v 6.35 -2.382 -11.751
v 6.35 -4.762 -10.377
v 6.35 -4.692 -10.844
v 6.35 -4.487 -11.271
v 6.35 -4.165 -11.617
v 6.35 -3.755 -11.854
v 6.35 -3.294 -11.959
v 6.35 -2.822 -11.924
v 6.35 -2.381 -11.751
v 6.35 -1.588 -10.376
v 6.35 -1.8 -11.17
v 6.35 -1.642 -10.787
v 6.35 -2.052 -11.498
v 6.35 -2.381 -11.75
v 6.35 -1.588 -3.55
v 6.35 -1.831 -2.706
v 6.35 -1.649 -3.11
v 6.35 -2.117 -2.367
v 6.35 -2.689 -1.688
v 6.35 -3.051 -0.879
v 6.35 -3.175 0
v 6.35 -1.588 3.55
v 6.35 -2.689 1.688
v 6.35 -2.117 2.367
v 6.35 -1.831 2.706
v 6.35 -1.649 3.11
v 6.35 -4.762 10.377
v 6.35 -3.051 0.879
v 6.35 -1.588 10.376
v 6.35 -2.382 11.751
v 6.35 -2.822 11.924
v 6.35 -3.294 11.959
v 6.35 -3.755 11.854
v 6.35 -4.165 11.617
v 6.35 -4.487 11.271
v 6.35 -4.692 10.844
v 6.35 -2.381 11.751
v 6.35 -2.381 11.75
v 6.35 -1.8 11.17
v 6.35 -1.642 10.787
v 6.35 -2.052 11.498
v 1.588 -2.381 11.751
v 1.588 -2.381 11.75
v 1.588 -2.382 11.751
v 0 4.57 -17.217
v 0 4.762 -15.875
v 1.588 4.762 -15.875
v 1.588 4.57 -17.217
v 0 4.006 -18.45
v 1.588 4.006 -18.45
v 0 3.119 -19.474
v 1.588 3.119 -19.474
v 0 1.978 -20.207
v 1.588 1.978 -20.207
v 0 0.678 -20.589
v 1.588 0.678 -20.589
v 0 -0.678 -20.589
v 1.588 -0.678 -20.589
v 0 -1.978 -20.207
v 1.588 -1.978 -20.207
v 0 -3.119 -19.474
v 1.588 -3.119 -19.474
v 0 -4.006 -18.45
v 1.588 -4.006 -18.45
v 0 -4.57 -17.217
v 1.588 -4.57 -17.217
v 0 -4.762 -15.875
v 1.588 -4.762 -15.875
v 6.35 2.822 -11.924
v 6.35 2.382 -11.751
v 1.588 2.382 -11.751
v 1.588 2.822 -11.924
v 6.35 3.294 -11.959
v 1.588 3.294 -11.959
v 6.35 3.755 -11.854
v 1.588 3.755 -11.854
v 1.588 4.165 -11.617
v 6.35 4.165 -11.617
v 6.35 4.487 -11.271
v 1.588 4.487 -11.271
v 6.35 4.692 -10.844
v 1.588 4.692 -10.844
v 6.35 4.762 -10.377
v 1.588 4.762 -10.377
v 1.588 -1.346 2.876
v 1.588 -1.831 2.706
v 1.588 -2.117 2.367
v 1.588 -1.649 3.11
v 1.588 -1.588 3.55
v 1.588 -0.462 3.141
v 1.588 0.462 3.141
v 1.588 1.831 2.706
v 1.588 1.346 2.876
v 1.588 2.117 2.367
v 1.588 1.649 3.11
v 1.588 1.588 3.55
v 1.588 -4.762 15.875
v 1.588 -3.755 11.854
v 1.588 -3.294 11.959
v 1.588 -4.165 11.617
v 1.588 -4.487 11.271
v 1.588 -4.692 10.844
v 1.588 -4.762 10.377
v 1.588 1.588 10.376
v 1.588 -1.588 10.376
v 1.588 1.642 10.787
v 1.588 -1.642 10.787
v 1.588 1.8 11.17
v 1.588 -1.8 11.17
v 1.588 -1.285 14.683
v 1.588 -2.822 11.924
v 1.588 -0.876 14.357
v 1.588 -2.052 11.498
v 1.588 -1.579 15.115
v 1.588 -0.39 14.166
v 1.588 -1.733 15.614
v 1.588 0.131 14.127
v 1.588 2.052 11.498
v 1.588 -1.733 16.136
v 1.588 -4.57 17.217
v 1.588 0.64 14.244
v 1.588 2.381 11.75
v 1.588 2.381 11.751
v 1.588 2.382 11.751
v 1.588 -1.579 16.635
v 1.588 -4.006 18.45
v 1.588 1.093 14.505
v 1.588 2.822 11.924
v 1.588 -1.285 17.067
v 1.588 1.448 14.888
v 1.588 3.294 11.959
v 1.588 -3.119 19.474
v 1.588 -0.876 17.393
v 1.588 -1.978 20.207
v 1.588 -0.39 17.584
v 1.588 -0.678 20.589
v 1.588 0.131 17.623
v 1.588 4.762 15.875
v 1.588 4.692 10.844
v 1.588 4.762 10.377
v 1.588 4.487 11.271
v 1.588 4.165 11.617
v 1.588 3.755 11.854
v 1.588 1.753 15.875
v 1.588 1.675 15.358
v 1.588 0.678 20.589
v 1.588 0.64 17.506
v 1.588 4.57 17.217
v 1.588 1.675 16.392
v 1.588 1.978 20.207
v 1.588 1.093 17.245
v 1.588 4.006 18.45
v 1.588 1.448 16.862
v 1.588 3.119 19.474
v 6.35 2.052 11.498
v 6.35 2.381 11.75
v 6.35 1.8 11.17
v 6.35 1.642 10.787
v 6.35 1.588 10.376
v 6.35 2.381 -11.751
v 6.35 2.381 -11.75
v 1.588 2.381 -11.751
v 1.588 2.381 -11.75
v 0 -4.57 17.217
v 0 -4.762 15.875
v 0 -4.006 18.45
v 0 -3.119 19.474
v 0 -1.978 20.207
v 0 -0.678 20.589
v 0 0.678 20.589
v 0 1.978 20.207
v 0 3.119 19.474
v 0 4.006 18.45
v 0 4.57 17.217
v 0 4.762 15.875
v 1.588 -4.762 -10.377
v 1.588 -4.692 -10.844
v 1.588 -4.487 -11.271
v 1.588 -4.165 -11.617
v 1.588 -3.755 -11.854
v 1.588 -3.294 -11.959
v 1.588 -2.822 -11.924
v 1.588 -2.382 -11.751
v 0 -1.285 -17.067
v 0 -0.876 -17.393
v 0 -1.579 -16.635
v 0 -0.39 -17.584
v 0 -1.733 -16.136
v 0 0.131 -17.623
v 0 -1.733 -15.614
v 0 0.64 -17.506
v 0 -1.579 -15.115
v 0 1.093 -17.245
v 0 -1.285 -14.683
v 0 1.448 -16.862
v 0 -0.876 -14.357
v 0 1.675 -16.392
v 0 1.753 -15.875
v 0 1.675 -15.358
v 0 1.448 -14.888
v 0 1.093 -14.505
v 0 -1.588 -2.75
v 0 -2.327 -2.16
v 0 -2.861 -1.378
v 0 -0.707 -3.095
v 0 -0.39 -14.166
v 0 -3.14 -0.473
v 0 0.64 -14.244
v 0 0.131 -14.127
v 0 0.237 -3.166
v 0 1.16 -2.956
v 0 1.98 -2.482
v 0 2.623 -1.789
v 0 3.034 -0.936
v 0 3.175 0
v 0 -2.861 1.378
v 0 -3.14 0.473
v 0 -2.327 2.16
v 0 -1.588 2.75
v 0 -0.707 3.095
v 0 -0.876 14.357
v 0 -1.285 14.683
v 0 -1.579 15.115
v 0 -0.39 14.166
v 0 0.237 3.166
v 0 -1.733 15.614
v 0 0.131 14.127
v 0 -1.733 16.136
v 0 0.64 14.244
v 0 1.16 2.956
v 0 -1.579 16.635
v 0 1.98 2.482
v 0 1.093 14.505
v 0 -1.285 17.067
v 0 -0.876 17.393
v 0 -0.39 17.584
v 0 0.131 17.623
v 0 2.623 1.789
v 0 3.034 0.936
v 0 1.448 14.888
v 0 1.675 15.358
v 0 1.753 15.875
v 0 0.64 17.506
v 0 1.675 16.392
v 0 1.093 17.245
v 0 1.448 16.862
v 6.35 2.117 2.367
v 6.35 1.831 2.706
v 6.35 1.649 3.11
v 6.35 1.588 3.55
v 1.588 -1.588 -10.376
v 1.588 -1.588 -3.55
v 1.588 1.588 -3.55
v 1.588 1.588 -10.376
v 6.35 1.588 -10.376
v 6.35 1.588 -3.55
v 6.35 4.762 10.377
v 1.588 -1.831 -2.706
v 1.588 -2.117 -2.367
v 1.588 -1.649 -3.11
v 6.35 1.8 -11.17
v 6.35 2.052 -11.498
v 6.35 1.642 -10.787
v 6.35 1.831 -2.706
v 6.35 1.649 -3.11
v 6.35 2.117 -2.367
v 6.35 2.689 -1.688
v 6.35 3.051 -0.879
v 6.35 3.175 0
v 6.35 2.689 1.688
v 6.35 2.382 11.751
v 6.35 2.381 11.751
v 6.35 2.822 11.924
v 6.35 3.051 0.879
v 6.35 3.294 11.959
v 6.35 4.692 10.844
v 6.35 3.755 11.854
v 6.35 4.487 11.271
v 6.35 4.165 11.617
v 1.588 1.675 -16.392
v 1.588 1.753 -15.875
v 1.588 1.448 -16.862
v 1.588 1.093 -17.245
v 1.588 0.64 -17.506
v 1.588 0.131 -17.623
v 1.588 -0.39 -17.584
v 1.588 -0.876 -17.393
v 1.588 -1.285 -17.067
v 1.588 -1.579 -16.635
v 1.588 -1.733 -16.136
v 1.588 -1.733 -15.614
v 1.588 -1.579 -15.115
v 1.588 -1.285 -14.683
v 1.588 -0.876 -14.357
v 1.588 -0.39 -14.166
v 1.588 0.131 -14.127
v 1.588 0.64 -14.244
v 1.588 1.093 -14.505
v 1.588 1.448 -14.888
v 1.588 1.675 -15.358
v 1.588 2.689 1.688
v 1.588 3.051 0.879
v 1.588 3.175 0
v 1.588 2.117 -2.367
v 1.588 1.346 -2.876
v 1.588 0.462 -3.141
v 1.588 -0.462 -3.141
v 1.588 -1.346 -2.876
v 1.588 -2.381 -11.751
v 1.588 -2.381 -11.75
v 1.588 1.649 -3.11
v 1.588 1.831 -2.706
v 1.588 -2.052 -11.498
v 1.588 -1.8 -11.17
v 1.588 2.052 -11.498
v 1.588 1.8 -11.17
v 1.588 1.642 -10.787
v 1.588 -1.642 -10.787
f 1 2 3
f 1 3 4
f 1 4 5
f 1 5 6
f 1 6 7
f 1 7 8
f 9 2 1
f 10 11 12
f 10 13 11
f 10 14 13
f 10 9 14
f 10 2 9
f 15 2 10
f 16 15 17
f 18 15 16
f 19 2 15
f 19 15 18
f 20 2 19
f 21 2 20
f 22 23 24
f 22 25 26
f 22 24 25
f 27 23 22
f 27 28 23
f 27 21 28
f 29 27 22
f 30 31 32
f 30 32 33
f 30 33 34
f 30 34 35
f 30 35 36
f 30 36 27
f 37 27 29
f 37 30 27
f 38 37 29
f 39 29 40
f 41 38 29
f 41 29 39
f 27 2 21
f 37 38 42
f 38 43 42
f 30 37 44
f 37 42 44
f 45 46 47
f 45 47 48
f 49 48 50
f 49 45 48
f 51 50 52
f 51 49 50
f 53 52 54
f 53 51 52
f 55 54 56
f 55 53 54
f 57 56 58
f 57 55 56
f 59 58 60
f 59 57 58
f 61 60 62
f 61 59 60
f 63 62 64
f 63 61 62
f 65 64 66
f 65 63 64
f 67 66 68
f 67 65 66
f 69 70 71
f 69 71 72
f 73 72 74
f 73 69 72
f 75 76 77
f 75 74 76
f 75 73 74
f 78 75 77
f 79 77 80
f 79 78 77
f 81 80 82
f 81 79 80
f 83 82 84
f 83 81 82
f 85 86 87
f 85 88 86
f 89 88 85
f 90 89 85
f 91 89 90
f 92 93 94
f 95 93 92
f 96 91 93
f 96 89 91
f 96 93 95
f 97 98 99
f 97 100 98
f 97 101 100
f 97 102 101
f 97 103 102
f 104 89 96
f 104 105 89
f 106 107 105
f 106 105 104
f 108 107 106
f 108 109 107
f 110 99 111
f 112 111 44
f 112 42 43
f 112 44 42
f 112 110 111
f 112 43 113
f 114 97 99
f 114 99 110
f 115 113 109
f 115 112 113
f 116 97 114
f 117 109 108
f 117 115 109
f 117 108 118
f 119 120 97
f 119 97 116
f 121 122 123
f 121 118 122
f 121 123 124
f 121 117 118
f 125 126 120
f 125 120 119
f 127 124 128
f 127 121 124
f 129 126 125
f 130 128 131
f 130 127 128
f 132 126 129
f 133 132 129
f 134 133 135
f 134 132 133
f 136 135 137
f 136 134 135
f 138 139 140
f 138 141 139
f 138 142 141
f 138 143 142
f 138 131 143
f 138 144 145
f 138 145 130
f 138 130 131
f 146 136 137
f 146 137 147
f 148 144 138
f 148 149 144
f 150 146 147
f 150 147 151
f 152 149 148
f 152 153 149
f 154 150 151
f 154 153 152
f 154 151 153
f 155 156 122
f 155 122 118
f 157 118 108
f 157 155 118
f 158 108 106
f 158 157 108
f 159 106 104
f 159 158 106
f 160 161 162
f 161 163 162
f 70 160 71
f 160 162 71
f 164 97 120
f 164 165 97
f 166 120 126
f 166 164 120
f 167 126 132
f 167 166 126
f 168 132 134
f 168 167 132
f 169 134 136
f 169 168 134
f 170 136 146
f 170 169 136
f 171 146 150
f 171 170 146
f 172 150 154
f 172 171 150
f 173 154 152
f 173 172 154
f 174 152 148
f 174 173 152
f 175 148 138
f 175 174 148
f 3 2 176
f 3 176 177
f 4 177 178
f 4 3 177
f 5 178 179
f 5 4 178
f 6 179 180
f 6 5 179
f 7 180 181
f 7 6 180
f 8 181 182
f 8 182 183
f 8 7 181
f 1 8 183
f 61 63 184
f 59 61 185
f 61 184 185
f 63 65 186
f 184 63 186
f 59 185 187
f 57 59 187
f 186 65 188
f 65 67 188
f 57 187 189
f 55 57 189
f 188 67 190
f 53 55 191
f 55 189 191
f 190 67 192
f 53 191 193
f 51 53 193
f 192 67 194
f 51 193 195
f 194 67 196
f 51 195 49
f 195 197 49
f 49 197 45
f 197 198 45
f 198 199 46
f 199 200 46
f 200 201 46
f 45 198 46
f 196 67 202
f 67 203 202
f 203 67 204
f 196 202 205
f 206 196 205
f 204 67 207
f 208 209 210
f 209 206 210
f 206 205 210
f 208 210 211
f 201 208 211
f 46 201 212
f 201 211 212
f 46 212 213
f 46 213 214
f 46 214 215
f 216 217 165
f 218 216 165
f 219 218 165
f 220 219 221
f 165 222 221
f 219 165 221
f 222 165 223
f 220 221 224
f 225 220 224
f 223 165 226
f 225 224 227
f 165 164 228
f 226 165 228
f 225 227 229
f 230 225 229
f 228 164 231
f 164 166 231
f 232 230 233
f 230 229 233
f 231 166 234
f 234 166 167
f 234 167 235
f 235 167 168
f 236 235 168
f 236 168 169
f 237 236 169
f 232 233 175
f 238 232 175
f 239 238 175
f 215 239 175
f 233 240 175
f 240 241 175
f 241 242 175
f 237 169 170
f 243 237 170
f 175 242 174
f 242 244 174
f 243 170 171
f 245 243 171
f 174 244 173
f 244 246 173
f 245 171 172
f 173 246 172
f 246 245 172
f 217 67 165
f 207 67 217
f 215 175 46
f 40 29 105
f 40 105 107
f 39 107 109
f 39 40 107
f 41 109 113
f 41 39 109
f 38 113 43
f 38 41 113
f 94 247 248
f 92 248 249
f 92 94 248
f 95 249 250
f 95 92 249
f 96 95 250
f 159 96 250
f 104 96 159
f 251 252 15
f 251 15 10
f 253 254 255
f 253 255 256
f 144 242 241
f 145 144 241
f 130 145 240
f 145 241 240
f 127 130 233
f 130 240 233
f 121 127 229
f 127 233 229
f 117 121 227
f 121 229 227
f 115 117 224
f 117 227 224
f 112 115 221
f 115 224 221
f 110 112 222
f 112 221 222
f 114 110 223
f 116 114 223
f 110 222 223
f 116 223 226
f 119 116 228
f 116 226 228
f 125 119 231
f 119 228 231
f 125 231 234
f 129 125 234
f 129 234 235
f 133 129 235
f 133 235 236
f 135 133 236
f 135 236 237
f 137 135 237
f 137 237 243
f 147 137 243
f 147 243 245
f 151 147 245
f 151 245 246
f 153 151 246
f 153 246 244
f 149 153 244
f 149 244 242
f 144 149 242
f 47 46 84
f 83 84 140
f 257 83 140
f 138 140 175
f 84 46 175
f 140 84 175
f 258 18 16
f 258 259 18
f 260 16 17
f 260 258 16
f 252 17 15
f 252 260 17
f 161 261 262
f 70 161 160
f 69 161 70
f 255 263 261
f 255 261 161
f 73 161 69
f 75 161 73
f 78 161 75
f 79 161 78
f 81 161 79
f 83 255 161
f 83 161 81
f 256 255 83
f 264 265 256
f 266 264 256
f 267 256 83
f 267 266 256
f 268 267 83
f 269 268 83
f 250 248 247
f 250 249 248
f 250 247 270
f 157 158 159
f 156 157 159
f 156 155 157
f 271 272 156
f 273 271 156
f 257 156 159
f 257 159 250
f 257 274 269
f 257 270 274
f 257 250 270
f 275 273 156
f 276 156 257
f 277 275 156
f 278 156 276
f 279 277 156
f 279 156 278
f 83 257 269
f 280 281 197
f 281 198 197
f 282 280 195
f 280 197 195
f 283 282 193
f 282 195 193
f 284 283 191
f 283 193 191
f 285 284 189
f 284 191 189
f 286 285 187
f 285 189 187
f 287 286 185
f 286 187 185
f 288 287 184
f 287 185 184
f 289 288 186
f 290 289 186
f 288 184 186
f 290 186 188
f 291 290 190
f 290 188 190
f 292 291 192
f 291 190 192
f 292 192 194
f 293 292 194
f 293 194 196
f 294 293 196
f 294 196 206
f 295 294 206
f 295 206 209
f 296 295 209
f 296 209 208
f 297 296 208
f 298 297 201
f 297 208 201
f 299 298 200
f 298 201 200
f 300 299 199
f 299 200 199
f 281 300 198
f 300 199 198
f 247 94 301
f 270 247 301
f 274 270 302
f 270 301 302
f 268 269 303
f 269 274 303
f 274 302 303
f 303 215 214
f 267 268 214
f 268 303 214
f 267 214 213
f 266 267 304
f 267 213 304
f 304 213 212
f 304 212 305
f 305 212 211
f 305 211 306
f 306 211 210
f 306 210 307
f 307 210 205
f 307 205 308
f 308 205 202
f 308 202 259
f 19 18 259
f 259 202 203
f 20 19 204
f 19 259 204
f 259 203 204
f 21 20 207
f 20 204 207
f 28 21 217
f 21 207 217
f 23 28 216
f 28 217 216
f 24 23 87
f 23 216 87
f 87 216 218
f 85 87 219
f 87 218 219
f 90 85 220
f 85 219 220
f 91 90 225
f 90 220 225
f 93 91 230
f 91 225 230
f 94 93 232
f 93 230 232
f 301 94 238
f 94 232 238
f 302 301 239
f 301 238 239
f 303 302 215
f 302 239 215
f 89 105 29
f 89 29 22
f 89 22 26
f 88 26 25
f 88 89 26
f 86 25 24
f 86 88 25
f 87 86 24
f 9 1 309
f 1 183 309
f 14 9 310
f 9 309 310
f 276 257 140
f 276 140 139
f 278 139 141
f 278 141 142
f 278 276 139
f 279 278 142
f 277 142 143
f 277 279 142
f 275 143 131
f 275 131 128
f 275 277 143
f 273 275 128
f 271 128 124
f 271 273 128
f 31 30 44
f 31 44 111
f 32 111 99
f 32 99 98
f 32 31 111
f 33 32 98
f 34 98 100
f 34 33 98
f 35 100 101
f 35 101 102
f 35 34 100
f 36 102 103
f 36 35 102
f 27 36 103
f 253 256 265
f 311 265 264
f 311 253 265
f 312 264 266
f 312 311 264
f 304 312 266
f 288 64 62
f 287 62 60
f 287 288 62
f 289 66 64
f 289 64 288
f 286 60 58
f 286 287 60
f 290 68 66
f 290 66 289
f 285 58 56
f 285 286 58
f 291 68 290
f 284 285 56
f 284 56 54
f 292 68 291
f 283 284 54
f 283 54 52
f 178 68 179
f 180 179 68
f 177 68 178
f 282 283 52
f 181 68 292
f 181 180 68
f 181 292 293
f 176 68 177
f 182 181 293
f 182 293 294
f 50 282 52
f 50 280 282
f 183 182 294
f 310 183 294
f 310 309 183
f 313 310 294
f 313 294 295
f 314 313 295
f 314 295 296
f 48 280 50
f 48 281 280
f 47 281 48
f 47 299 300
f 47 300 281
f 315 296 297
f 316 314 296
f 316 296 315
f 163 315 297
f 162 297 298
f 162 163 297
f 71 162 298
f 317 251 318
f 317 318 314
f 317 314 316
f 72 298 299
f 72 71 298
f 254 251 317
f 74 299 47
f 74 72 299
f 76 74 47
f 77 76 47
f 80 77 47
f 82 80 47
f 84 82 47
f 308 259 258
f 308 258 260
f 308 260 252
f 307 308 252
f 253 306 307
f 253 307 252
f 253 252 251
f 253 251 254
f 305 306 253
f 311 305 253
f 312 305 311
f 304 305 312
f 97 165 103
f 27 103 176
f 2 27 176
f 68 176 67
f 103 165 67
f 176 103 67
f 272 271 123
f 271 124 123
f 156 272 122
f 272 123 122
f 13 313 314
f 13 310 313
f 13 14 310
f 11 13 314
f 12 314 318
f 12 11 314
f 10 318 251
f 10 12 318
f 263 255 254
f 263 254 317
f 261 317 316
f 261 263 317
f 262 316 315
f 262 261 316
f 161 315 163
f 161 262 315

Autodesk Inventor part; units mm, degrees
ref_plane "YZ Plane" through (0, 0, 0) normal (1, 0, 0) x (0, 1, 0)
ref_plane "XZ Plane" through (0, 0, 0) normal (0, 1, 0) x (-1, 0, 0)
ref_plane "XY Plane" through (0, 0, 0) normal (0, 0, 1) x (1, 0, 0)
sketch "Sketch1" plane through (0, 0, 0) normal (1, 0, 0) x (0, 1, 0)
  circle A0 centre (0, 0) radius 3.175
  circle A1 centre (0, 0) radius 15.875 construction
  line L0 (0, 0) -> (0, 15.875) construction
  circle A2 centre (0, 15.875) radius 1.7526
  circle A3 centre (0, -15.875) radius 1.7526
  line L1 (0, 15.875) -> (0, -15.875) construction
  line L2 (-4.7625, 15.875) -> (-4.7625, -15.875)
  line L3 (4.7625, -15.875) -> (4.7625, 15.875)
  arc A4 (4.7625, 15.875) -> (-4.7625, 15.875) centre (0, 15.875) ccw
  arc A5 (-4.7625, -15.875) -> (4.7625, -15.875) centre (0, -15.875) ccw
  line L4 (1.5875, 15.1324) -> (-1.5875, 15.1324) construction
  line L5 (-1.5875, 15.1324) -> (-1.5875, -15.1324)
  line L6 (-1.5875, -15.1324) -> (1.5875, -15.1324) construction
  line L7 (1.5875, -15.1324) -> (1.5875, 15.1324)
  line L8 (1.5875, 15.1324) -> (-1.5875, -15.1324) construction
  line L9 (-1.5875, 15.1324) -> (1.5875, -15.1324) construction
  circle A6 centre (0, 15.875) radius 4.7625
  circle A7 centre (0, -15.875) radius 4.7625
  point P0 (-4.7625, -15.875)
  point P1 (-1.5875, -11.3849)
  point P2 (-1.5875, -2.7496)
  point P3 (-1.5875, 2.7496)
  point P4 (-1.5875, 11.3849)
  point P5 (1.5875, 11.3849)
  point P6 (1.5875, 2.7496)
  point P7 (1.5875, -2.7496)
  point P8 (1.5875, -11.3849)
  dimension "d1" = 31.75
  dimension "d0" = 6.35
  dimension "d2" = 3.5052
  dimension "d5" = 360
  dimension "d7" = 9.525
  dimension "d8" = 3.175
extrude "Extrusion1" add sketch "Sketch1" along normal blind 1.5875 contours A0 L7 A6 L3 A7 | A0 L5 A6 L7 | L7 A7 L5 A0 | A0 L5 A7 L2 A6 | A6 L5 A2 L7 | L7 A2 L5 A6 A4 | A7 A5 L5 A3 L7 | L7 A3 L5 A7
extrude "Extrusion2" add sketch "Sketch1" along normal blind 6.35 contours A0 L7 A6 L3 A7 | A0 L5 A7 L2 A6
fillet "Fillet1" radius 1.5875 8 edges at (3.9687, 4.7625, 15.875) (3.9687, -4.7625, 15.875) (3.9687, 4.7625, -15.875) (3.9687, -4.7625, -15.875) (3.9687, 1.5875, -11.3849) (3.9687, -1.5875, -11.3849) (3.9687, 1.5875, 11.3849) (3.9687, -1.5875, 11.3849)
fillet "Fillet2" radius 1.5875 4 edges at (3.9687, 1.5875, 2.7496) (3.9687, -1.5875, 2.7496) (3.9687, 1.5875, -2.7496) (3.9687, -1.5875, -2.7496)
properties part number "Pin Slot" material "Aluminum 6061"
